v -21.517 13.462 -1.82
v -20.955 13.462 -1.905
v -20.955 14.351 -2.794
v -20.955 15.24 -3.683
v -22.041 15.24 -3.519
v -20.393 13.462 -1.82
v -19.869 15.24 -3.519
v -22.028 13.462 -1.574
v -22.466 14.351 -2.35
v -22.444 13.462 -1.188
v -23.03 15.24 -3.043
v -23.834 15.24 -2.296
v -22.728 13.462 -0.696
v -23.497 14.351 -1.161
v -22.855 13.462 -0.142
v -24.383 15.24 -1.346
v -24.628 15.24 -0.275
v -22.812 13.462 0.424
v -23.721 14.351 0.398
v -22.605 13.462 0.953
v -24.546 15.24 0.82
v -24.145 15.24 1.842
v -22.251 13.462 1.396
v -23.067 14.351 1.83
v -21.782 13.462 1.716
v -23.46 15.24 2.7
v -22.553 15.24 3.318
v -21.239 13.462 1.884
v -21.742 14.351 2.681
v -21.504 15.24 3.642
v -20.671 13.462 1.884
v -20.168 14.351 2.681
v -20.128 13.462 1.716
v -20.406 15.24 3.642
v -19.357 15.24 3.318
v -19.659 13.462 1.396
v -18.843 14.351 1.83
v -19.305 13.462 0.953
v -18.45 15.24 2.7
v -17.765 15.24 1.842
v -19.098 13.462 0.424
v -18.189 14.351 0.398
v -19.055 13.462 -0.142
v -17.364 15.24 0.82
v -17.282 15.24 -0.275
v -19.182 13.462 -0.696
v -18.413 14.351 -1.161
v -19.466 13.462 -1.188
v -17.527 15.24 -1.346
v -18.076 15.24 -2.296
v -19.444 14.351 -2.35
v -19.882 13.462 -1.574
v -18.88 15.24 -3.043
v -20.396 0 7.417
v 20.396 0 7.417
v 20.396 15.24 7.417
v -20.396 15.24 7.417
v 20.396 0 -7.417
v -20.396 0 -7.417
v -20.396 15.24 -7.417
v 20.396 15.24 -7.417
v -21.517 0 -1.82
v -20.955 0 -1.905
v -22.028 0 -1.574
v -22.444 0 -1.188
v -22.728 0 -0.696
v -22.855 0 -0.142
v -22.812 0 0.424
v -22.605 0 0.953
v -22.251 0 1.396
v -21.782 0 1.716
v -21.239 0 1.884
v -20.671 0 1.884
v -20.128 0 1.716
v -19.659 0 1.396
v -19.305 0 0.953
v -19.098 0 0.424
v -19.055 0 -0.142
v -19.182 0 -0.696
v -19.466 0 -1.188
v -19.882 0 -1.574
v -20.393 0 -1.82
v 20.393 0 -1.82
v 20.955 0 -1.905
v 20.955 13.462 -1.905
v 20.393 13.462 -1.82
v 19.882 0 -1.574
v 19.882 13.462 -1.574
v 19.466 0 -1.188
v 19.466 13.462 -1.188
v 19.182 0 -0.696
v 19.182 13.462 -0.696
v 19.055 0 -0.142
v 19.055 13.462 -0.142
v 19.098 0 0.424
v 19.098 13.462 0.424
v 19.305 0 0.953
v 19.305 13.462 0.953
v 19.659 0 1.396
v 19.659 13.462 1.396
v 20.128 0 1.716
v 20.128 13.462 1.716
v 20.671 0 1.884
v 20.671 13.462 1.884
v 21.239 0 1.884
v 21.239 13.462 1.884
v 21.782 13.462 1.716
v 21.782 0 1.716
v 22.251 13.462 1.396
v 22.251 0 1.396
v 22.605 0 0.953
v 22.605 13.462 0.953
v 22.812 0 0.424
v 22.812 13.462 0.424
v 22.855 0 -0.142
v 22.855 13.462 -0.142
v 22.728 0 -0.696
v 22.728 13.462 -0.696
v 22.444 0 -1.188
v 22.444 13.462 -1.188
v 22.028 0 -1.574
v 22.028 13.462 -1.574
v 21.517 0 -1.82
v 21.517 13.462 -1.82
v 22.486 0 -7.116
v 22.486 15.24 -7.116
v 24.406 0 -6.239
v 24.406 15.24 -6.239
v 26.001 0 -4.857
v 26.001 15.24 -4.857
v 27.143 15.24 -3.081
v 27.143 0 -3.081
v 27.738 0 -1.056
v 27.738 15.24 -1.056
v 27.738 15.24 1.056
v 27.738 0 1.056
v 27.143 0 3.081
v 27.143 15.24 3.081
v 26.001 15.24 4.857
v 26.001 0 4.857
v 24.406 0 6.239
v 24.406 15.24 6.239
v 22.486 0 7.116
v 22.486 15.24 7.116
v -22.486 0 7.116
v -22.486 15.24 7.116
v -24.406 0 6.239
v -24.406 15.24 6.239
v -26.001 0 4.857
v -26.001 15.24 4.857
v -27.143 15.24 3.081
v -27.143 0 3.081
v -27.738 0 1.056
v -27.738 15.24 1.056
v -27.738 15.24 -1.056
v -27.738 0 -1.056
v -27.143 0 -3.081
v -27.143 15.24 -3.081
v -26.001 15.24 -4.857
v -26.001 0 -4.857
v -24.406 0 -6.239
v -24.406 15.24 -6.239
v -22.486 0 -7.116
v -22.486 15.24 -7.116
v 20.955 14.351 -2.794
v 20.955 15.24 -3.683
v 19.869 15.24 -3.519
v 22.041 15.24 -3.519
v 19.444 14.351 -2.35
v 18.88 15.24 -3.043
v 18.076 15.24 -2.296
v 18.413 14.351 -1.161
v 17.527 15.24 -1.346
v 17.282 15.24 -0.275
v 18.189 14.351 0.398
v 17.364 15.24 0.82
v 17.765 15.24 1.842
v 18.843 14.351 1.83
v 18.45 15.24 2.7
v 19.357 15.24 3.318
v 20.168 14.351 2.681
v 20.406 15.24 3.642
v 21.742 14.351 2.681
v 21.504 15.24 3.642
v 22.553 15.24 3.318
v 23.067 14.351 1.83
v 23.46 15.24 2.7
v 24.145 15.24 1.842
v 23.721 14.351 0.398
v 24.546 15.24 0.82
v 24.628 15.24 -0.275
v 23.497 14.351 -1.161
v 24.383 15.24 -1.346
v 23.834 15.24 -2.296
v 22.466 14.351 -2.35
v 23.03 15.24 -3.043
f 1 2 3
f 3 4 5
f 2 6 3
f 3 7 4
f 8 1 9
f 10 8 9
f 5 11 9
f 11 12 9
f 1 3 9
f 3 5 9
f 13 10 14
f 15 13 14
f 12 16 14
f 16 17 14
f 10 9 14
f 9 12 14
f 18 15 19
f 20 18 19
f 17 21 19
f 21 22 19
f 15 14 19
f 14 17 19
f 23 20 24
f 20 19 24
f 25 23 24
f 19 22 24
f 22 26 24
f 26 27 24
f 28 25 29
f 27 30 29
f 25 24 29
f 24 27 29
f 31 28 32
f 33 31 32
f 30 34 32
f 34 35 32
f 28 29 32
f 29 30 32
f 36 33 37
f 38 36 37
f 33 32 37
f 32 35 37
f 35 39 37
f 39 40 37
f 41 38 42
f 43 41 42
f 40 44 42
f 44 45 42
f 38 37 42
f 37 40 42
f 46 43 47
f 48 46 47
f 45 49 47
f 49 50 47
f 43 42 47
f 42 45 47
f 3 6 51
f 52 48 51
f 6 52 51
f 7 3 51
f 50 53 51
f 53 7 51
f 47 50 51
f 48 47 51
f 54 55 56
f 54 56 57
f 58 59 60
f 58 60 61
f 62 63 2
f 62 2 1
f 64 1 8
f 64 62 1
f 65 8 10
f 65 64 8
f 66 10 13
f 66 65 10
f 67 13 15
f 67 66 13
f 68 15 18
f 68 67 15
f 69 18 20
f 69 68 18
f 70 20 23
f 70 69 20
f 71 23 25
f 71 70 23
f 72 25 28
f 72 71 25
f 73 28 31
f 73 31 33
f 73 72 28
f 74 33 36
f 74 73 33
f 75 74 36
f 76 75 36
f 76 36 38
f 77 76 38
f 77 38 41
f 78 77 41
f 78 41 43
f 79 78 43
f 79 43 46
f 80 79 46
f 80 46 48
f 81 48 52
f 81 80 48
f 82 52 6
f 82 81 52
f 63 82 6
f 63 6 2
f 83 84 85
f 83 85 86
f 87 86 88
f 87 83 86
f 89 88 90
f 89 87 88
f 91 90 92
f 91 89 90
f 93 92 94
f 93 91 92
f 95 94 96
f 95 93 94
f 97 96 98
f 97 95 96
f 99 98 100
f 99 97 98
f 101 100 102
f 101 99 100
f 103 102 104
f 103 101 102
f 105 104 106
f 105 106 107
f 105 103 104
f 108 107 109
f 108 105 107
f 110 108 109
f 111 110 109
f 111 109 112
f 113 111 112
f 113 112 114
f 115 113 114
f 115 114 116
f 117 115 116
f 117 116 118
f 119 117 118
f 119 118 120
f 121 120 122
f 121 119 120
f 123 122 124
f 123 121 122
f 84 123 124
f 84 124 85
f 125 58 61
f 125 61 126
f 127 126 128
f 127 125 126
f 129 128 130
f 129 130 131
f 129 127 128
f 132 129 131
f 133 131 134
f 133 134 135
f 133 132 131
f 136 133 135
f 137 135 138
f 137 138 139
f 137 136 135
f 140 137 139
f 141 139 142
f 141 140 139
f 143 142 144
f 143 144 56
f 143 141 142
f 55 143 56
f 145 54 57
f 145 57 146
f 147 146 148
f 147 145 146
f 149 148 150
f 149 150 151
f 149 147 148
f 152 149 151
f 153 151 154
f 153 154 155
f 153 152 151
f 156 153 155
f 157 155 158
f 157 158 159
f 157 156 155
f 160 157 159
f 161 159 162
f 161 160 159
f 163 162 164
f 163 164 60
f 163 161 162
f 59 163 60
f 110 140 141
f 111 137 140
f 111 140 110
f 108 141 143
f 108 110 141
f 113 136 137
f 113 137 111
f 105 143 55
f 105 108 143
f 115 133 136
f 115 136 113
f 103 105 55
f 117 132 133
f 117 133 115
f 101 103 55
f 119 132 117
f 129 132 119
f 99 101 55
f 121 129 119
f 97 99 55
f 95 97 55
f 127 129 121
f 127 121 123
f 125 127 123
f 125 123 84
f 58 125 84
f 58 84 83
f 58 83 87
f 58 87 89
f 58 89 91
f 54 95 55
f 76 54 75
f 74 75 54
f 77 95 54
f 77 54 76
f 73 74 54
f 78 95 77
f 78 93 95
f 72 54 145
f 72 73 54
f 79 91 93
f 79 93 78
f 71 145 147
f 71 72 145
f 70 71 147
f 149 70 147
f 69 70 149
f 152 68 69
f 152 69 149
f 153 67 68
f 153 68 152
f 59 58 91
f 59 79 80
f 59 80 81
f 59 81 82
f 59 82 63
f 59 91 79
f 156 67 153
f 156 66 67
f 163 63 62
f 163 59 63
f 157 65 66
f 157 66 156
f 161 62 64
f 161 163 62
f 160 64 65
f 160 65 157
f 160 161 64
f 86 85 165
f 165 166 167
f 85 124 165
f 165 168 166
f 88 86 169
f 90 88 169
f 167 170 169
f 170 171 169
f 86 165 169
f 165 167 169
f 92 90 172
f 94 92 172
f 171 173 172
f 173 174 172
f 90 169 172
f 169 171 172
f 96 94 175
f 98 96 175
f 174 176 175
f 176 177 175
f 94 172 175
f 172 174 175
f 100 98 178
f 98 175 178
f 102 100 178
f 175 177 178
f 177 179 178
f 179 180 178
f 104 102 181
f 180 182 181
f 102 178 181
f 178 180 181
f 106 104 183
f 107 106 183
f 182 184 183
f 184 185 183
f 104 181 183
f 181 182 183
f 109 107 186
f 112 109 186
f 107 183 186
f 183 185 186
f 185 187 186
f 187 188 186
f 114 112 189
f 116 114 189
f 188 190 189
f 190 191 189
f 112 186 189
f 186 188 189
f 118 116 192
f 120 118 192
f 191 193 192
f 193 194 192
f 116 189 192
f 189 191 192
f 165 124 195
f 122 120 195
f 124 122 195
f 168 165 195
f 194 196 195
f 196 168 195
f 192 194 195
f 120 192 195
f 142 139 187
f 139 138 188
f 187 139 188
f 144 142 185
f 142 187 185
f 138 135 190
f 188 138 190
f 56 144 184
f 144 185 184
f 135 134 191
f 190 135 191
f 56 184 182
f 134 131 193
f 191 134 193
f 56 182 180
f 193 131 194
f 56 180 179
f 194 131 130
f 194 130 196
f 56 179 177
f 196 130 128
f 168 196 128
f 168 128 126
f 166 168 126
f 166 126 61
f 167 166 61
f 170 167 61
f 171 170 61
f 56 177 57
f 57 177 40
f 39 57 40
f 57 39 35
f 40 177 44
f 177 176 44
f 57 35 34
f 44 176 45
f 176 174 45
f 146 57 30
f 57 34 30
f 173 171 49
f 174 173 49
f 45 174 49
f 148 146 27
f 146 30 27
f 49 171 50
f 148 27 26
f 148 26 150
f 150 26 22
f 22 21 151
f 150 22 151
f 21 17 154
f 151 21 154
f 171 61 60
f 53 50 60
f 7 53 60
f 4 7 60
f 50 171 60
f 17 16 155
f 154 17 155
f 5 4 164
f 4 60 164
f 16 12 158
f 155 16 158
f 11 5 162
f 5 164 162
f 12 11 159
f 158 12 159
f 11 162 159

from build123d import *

# Parameters (mm, degrees)
SKETCH1_R           = 1.905
BOSS_EXTRUDE1_DEPTH = 15.24
CHAMFER1_SIZE       = 1.778


with BuildPart() as part:
    # Sketch1 → Boss-Extrude1 (new body)
    with BuildSketch(Plane(origin=(0, 0, 0), x_dir=(1, 0, 0), z_dir=(0, 1, 0))):
        with BuildLine():
            Line((-20.3962, 7.4168), (20.3962, 7.4168))
            ThreePointArc((20.3962, 7.4168), (27.813, 0), (20.3962, -7.4168))
            Line((20.3962, -7.4168), (-20.3962, -7.4168))
            ThreePointArc((-20.3962, -7.4168), (-27.813, 0), (-20.3962, 7.4168))
        make_face()
        with Locations(Location((-20.955, 0, 0), (0, 0, 90))):
            Circle(SKETCH1_R, mode=Mode.SUBTRACT)
        with Locations(Location((20.955, 0, 0), (0, 0, 90))):
            Circle(SKETCH1_R, mode=Mode.SUBTRACT)
    extrude(amount=BOSS_EXTRUDE1_DEPTH)

    # Chamfer1
    chamfer1_edges = [part.edges().sort_by_distance(p)[0] for p in [
        (-20.955, 15.24, 1.905),
        (20.955, 15.24, 1.905),
    ]]
    chamfer(chamfer1_edges, length=CHAMFER1_SIZE)


solid = part.part
